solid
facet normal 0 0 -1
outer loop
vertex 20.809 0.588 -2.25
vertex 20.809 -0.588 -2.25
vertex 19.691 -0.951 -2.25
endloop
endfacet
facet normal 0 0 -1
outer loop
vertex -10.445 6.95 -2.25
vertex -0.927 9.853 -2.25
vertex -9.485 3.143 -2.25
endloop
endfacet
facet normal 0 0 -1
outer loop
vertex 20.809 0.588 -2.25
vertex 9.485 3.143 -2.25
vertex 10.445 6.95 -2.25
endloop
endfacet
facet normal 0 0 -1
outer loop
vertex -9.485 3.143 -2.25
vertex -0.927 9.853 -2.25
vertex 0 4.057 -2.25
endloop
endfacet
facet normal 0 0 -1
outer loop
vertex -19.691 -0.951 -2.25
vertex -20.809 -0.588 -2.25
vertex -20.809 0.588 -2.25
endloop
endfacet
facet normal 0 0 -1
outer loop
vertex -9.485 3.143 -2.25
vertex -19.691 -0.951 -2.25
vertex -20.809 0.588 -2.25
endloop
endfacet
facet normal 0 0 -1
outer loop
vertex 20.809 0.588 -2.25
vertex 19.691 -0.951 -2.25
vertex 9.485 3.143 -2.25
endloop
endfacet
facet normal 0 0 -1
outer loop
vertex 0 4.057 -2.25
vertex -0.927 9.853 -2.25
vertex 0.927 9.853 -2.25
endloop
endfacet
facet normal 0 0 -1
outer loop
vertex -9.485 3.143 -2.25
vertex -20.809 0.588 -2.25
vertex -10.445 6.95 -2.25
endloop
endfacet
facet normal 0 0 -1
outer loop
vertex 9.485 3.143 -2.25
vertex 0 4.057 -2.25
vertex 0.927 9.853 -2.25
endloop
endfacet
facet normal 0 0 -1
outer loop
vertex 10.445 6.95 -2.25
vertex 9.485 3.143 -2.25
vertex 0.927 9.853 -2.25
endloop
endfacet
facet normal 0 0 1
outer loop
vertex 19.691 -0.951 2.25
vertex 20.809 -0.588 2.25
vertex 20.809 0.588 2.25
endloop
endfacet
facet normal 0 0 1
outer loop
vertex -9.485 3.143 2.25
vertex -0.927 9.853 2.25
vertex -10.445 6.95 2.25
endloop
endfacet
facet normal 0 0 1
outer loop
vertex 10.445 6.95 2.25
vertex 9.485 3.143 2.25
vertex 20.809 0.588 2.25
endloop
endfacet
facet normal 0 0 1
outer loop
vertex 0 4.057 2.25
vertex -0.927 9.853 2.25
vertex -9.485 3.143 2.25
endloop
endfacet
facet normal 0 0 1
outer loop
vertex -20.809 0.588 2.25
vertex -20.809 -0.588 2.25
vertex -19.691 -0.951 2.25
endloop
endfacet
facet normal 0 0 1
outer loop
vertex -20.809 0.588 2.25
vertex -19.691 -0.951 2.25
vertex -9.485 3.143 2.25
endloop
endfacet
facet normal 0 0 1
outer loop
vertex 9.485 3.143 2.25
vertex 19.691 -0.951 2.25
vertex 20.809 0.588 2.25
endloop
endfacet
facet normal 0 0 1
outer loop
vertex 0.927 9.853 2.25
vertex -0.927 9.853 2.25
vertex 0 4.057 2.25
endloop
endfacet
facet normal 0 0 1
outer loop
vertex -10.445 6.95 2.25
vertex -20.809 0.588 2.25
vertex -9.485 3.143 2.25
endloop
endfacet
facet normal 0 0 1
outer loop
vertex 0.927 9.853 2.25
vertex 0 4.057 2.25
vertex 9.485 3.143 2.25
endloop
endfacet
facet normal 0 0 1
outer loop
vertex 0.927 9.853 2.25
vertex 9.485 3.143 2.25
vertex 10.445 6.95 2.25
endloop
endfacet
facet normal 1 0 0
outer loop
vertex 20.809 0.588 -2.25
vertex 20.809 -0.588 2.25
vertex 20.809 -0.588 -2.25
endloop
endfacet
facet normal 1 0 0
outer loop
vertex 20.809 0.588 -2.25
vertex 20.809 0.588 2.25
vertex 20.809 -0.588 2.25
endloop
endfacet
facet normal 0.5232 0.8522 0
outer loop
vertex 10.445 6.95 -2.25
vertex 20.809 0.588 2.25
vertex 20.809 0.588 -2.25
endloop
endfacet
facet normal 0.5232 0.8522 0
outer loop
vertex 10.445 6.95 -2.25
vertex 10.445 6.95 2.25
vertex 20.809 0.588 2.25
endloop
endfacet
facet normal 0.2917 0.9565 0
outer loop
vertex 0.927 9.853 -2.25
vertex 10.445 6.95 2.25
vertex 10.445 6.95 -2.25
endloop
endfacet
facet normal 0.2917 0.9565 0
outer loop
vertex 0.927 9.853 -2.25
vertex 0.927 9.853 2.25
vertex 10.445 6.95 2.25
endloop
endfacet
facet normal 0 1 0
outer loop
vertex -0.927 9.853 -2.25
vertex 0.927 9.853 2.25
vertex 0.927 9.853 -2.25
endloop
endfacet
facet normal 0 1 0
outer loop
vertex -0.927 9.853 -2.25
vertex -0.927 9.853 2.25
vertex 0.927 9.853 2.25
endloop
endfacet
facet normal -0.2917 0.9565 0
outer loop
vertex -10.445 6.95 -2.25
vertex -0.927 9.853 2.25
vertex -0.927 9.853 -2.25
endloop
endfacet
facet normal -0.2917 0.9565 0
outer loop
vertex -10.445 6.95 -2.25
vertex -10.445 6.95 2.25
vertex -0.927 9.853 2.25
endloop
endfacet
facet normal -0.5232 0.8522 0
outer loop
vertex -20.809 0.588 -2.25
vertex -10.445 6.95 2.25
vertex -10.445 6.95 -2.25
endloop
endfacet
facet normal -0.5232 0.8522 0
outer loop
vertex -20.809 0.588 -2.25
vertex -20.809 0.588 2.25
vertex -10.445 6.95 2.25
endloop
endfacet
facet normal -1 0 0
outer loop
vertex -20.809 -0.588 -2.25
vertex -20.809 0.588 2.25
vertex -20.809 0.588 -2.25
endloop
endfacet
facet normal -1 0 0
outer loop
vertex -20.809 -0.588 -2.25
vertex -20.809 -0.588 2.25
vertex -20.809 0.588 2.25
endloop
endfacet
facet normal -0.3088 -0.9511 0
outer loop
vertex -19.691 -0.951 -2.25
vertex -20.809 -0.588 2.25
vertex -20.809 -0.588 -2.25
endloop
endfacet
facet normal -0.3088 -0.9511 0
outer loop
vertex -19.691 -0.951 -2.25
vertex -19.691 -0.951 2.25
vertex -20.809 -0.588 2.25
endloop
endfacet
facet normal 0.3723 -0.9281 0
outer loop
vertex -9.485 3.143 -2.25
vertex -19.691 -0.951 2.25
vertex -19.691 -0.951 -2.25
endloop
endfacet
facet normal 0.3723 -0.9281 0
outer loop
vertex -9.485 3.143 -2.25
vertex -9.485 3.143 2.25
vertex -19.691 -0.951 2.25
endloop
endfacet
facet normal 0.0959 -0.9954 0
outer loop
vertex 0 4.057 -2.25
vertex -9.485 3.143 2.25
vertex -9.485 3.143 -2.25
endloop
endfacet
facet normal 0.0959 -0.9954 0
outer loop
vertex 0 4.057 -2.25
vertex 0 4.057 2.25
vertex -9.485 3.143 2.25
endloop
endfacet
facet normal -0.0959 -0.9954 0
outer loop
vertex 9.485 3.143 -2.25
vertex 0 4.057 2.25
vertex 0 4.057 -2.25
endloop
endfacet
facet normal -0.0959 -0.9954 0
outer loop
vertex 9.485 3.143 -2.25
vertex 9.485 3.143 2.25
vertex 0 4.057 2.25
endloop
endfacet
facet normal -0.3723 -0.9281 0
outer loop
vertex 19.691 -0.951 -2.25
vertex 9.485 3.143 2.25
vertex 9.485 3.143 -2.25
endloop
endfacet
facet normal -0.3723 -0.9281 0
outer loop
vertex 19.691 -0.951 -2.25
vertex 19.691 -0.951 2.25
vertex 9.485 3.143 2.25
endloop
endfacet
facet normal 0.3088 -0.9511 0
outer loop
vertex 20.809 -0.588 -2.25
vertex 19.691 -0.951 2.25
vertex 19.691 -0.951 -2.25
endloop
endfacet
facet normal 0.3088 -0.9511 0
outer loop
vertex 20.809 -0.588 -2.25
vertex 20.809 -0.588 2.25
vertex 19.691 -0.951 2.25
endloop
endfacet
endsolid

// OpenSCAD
// opening flower

//variables

stemDiameter=20;
peduncleDiameter=stemDiameter/0.7;
peduncleHeight=20;
stalkHeight=20;
stalkDiameter=peduncleDiameter;
petalWidth=peduncleDiameter/2.2;
petalThickness=5;
petalHeight=45;

module axle() {
    rotate([0,90,0]) cylinder(h=petalWidth*3,d=2.5,center=true);
}

module hullCylinder() {
    for (i=[1:1:20]) {
        hull() {
        translate([-20,0,5*i/10]) cylinder(h=5,d1=i,d2=i+10);
        translate([-10,5,5*i/10]) cylinder(h=5,d1=i,d2=i+10);
    }
}
}
    
  *hullCylinder();

module petalBladeHalf() {
    hull() {
        translate([-20,0,0]) circle(d=2);
        translate([-10,5,0]) circle(d=4);
    }
    hull(){
        translate([-10,5,0]) circle(d=4);
        translate([0,7,0]) circle(d=6);
       
    }
}


module petalBlade() {
    linear_extrude(height = petalHeight/10, center = true) {
    petalBladeHalf();
    mirror([1,0,0]) petalBladeHalf();
    }
}
!petalBlade();

module petal(petalThickness1) {

  
            rotate([-25,0,0]) translate([ -petalWidth/2,peduncleDiameter/8,peduncleHeight/2.3 ]) 
    difference(){
        union() {
        cube([petalWidth-2,petalThickness1,petalHeight],center=false);
            translate([(petalWidth-2)/2,0,2]) cylinder(h=3,d=6, center=true);
        }
                union() {
        translate([petalWidth/2,petalThickness1/2,peduncleHeight*0.5])  axle();
            
            translate([petalWidth/2-1,petalThickness1/2,petalHeight-3]) cube([8,3,8],center=true);
                     translate([(petalWidth-2)/2,0,2]) cylinder(h=4,d=4, center=true);           
        }
    }
}

*petal(petalThickness);

module corolla(petalThickness1) {
     petal(petalThickness1);
    rotate([0,0,120])  petal(petalThickness1);
    rotate([0,0,240])  petal(petalThickness1);
    
  
}
module peduncleCutOut() {
      translate([0,peduncleDiameter/2,peduncleHeight*0.6]) cube([peduncleDiameter*0.45,petalWidth+2,peduncleHeight ],center=true);
            translate ([0, peduncleDiameter*0.45,peduncleHeight*0.8]) axle();
            translate([0,0,-(peduncleHeight+stalkHeight+0.2)/2]) cylinder(h=peduncleHeight*3,d=peduncleDiameter*0.7, center=false);
            
}


module peduncle() {
    difference() {
        union() {
        cylinder(h=peduncleHeight,d1=peduncleDiameter,d2=peduncleDiameter*1.3,center=false);
            translate([0,0,-stalkHeight]) cylinder(h=stalkHeight,d=stalkDiameter);
        }
        union() {
          peduncleCutOut();
              rotate([0,0,120]) peduncleCutOut();
    rotate([0,0,240]) peduncleCutOut();
        }
    }
}


peduncle();

module flower() {
    peduncle();
    color("blue") scale([.9,.9,.9]) corolla(petalThickness);
}

flower();
